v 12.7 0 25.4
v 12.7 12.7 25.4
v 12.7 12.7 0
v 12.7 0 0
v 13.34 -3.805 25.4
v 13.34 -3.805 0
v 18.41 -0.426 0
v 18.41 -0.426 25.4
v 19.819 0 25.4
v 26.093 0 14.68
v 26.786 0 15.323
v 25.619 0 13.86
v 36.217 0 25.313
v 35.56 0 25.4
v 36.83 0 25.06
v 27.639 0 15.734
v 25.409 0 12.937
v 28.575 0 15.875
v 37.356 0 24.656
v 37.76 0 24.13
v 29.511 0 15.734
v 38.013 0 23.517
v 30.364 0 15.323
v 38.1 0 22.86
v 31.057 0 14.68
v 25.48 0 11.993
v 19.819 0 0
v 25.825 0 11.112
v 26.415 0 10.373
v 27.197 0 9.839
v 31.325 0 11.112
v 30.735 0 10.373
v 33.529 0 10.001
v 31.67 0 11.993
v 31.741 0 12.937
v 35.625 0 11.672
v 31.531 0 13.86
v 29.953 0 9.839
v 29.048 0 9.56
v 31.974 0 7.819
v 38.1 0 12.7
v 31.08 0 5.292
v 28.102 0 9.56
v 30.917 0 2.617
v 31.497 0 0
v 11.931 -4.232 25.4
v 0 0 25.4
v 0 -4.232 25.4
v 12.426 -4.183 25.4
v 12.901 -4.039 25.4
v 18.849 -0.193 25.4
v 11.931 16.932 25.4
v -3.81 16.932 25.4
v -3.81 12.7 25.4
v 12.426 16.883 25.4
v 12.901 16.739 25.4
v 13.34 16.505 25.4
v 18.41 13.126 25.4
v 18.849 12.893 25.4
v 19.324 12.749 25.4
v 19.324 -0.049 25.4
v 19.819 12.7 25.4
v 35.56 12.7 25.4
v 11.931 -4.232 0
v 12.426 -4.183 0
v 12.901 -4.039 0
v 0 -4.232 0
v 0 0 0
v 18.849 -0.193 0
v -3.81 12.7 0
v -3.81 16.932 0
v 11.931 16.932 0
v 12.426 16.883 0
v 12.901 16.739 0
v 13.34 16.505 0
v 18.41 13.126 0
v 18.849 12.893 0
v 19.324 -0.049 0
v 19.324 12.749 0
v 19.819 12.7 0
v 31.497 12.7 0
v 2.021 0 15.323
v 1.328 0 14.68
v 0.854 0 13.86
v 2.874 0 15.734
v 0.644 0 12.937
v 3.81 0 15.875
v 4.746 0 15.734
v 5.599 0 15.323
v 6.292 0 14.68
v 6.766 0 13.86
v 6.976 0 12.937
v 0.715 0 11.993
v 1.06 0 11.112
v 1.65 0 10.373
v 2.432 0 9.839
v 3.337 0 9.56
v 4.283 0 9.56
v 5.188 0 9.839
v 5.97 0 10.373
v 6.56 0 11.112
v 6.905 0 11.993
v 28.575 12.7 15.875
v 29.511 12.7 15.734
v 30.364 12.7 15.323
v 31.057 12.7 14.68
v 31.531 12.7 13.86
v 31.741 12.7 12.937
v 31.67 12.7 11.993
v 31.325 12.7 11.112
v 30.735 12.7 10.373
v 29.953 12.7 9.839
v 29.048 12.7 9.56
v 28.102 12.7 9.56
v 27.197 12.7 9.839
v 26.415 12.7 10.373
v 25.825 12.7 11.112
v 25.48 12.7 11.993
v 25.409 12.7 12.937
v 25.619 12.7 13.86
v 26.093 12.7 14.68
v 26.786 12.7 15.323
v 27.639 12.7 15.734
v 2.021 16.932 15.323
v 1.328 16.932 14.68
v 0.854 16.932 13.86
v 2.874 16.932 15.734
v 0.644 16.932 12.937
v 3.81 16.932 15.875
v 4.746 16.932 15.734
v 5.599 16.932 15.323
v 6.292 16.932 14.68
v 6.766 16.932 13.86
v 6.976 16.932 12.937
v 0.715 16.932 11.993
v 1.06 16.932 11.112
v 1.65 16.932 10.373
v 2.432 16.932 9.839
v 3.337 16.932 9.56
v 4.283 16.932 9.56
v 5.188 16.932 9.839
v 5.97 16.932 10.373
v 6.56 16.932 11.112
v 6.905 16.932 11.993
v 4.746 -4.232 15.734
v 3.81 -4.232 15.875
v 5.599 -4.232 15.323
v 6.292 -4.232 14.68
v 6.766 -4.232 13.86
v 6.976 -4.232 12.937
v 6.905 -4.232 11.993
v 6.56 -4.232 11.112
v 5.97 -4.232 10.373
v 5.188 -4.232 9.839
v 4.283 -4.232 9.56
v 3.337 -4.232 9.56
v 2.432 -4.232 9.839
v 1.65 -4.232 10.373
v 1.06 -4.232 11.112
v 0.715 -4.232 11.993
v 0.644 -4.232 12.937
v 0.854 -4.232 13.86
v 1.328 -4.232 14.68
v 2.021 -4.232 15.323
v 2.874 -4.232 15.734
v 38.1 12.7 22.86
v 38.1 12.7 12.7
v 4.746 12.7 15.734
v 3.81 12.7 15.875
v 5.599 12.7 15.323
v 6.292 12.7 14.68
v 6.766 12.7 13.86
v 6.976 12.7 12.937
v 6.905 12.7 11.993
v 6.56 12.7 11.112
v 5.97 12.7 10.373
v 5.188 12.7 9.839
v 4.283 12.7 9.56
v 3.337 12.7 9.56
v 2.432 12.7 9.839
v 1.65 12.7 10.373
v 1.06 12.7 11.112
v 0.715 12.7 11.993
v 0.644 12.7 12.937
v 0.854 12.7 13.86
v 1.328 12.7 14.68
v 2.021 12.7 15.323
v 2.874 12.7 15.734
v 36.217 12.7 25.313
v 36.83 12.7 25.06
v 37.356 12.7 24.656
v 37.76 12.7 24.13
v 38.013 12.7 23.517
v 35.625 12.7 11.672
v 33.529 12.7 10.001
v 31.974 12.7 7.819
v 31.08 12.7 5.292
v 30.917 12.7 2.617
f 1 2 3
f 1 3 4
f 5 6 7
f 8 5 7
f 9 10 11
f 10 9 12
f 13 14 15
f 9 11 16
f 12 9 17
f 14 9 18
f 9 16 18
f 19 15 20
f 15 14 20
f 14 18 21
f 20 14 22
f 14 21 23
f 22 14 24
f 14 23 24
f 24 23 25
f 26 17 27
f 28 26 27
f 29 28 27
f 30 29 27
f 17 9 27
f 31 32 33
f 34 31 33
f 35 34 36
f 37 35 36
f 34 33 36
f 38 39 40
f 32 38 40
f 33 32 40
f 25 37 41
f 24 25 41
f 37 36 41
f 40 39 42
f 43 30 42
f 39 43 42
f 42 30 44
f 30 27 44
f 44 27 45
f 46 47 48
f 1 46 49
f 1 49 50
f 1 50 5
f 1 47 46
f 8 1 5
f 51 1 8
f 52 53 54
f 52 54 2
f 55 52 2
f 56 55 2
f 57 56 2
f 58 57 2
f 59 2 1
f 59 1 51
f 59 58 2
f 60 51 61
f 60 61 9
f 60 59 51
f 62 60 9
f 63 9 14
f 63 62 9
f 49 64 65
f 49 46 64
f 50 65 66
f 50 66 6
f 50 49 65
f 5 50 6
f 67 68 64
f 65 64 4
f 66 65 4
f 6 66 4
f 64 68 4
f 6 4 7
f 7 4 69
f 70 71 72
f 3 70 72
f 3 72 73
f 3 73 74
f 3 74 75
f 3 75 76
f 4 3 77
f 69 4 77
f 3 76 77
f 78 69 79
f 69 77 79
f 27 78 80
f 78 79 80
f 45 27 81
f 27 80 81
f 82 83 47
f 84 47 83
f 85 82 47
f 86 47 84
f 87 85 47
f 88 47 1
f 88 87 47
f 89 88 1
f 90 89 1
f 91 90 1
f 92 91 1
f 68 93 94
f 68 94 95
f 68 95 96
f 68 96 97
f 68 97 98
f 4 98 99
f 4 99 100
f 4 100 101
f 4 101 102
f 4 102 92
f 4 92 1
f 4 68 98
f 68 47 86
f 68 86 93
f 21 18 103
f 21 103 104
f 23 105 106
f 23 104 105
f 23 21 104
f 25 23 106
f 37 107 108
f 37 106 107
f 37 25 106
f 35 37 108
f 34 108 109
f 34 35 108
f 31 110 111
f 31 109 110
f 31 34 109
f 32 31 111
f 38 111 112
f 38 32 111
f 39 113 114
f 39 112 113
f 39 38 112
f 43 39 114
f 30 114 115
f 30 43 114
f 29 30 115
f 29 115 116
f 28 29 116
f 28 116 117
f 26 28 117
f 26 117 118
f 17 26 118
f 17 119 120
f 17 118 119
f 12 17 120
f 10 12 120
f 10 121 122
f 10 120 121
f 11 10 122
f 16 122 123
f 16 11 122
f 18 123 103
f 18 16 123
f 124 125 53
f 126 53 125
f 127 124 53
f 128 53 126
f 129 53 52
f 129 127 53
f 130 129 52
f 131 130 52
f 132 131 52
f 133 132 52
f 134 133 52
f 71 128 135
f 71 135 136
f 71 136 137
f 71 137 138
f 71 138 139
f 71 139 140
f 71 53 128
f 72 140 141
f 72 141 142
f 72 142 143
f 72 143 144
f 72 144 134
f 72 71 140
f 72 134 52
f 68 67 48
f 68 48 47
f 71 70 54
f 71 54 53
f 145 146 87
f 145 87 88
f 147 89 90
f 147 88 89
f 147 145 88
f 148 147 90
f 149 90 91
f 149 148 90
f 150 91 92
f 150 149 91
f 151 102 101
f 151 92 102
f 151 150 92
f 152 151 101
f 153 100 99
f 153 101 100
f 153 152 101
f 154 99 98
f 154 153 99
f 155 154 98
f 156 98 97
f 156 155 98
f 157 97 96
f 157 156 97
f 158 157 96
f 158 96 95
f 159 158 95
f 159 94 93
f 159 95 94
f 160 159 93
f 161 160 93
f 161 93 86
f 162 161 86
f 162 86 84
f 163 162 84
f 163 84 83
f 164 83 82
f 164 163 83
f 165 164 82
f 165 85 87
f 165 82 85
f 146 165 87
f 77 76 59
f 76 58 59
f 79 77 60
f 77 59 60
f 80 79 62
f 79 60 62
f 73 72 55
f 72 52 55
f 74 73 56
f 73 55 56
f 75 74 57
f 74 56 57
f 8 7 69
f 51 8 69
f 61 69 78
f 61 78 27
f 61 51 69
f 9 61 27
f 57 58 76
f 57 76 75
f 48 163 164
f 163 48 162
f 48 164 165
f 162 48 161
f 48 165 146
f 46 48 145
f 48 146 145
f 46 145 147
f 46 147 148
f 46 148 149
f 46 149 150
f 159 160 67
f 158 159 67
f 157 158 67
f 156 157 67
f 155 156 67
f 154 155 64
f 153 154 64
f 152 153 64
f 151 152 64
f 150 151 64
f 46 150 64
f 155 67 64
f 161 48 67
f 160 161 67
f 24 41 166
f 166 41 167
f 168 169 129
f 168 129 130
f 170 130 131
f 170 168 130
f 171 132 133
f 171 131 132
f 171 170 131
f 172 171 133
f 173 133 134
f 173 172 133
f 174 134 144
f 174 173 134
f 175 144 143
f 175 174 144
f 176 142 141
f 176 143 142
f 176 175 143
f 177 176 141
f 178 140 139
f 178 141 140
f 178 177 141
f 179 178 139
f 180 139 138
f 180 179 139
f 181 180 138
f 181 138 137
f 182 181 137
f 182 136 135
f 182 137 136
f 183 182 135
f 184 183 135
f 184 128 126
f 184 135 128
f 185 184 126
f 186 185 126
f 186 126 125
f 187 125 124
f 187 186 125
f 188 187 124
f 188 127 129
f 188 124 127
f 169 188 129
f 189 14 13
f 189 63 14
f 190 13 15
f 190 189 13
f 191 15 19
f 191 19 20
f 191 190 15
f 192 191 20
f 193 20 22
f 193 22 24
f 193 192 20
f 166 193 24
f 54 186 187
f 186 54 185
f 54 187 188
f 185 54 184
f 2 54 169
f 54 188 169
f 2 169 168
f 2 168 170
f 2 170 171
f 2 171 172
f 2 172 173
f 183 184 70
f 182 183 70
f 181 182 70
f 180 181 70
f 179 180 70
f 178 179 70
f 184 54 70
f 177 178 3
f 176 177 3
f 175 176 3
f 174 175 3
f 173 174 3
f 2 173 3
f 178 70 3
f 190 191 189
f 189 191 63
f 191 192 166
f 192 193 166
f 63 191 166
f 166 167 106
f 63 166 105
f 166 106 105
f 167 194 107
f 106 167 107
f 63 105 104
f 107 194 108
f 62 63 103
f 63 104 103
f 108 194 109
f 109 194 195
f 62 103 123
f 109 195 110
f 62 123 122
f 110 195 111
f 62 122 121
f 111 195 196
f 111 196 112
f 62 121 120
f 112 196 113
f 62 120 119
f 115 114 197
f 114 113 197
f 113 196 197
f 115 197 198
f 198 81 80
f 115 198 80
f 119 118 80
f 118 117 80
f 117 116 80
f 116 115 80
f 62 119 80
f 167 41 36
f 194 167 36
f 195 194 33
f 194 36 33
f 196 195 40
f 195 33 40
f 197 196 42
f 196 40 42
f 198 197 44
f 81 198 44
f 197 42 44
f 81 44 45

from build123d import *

# Parameters (mm, degrees)
SKETCH1_W               = 12.7
SKETCH1_H               = 4.23164
SKETCH1_W_2             = 16.51
BOSS_EXTRUDE1_DEPTH     = 25.4
CUT_EXTRUDE4_DEPTH      = 49.820594354
CUT_EXTRUDE4_DEPTH_BACK = 49.820594354
SKETCH4_R               = 3.175
CUT_EXTRUDE5_DEPTH      = 49.820594354
CUT_EXTRUDE5_DEPTH_BACK = 49.820594354
SKETCH6_R               = 3.175
CUT_EXTRUDE6_DEPTH      = 49.820594354
CUT_EXTRUDE6_DEPTH_BACK = 49.820594354
FILLET1_R               = 2.54


with BuildPart() as part:
    # Sketch1 → Boss-Extrude1 (new body)
    with BuildSketch(Plane.XY):
        with Locations((6.35, -2.11582)):
            Rectangle(SKETCH1_W, SKETCH1_H)
        Polygon((19.05, 0), (38.1, 0), (38.1, 12.7), (19.05, 12.7), (12.7, 16.93164), (12.7, 12.7), (12.7, 0), (12.7, -4.23164), align=None)
        with Locations((4.445, 14.81582)):
            Rectangle(SKETCH1_W_2, SKETCH1_H)
    extrude(amount=BOSS_EXTRUDE1_DEPTH)

    # Sketch4 → Cut-Extrude4 (cut, two sides: drawn at the far end of the back side and taken through both)
    with BuildSketch(Plane(origin=(0, 0, 0), x_dir=(1, 0, 0), z_dir=(0, 1, 0)).offset(-CUT_EXTRUDE4_DEPTH_BACK)):
        with Locations(Location((3.81, -12.7, 0), (0, 0, 270))):
            Circle(SKETCH4_R)
    extrude(amount=CUT_EXTRUDE4_DEPTH + CUT_EXTRUDE4_DEPTH_BACK, mode=Mode.SUBTRACT)

    # Sketch6 → Cut-Extrude5 (cut, two sides: drawn at the far end of the back side and taken through both)
    with BuildSketch(Plane(origin=(0, 12.7, 0), x_dir=(1, 0, 0), z_dir=(0, 1, 0)).offset(-CUT_EXTRUDE5_DEPTH_BACK)):
        with Locations(Location((28.575, -12.7, 0), (0, 0, 270))):
            Circle(SKETCH6_R)
    extrude(amount=CUT_EXTRUDE5_DEPTH + CUT_EXTRUDE5_DEPTH_BACK, mode=Mode.SUBTRACT)

    # Sketch7 → Cut-Extrude6 (cut, two sides: drawn at the far end of the back side and taken through both)
    with BuildSketch(Plane(origin=(0, 12.7, 0), x_dir=(1, 0, 0), z_dir=(0, 1, 0)).offset(-CUT_EXTRUDE6_DEPTH_BACK)):
        with BuildLine():
            Line((31.497009702, 0), (38.1, 0))
            Line((38.1, 0), (38.1, -12.7))
            ThreePointArc((38.1, -12.7), (31.974019773, -7.818507683), (31.497009702, 0))
        make_face()
    extrude(amount=CUT_EXTRUDE6_DEPTH + CUT_EXTRUDE6_DEPTH_BACK, mode=Mode.SUBTRACT)

    # Fillet1
    fillet1_edges = [part.edges().sort_by_distance(p)[0] for p in [
        (12.7, 16.93164, 12.7),
        (19.05, 12.7, 12.7),
        (19.05, 0, 12.7),
        (12.7, -4.23164, 12.7),
        (38.1, 6.35, 25.4),
    ]]
    fillet(fillet1_edges, radius=FILLET1_R)


solid = part.part
